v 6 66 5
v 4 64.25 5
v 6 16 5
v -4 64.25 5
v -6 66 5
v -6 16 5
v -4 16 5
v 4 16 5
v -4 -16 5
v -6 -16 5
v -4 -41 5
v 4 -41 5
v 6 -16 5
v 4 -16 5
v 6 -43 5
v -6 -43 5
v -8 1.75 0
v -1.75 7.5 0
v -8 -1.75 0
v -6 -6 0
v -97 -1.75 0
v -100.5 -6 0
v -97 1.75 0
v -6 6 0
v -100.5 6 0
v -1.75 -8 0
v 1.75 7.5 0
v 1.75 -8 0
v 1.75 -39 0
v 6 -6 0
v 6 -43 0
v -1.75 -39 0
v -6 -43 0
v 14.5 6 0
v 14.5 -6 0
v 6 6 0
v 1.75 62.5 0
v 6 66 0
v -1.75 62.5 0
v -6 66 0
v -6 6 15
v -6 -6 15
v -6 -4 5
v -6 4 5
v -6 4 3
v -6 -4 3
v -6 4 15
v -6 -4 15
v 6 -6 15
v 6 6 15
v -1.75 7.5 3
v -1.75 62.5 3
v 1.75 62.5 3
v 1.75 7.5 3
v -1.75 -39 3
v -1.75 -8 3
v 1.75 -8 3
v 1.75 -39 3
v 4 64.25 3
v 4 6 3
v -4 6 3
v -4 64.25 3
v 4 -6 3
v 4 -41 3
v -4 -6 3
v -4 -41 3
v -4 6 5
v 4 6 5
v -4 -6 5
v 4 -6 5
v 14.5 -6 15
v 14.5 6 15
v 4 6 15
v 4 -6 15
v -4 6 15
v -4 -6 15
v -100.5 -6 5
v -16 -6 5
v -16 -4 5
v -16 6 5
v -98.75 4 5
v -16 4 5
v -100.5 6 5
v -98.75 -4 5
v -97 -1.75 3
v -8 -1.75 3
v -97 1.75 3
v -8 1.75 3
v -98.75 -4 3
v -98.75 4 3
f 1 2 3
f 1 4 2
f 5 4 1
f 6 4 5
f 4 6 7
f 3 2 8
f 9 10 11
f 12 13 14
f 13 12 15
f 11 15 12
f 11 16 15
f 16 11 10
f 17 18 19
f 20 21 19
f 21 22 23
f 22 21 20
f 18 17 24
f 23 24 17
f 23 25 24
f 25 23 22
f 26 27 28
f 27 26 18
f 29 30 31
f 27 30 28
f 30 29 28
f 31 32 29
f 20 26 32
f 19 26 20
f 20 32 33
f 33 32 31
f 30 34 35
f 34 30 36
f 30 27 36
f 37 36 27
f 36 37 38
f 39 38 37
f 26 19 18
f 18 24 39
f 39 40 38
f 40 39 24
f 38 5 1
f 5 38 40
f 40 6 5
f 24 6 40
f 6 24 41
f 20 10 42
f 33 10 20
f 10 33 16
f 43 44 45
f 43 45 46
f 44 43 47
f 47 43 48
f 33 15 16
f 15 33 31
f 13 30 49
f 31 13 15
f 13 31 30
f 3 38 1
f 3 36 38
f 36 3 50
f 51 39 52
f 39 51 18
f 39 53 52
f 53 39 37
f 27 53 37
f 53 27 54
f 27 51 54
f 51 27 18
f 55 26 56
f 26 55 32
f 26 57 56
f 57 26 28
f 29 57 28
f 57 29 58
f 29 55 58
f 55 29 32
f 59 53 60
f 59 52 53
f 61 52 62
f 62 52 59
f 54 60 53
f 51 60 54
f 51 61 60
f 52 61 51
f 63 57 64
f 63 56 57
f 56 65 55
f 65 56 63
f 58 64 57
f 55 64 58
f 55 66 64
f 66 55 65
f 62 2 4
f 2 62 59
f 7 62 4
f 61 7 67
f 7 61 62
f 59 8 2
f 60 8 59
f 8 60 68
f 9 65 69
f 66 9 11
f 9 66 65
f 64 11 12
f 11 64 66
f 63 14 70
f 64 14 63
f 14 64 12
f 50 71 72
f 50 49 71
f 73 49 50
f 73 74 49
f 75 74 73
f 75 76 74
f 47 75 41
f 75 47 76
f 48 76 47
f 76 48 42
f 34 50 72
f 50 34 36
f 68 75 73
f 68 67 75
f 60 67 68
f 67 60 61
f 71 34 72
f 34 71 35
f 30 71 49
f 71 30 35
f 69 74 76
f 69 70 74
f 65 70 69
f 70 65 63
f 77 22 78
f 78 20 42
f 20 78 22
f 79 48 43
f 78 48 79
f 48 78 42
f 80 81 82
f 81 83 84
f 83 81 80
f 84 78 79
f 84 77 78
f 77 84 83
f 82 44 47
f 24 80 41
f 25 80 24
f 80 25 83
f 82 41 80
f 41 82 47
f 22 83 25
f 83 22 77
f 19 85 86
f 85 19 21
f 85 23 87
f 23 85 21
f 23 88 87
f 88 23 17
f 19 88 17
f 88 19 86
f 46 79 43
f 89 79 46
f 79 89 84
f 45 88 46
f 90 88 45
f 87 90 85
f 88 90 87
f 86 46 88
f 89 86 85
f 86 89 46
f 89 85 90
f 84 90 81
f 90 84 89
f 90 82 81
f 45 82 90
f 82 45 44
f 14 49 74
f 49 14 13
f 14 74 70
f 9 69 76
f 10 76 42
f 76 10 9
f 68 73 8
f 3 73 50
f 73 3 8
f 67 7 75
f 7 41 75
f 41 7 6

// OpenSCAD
//Phone Microscope Adapter Body

module triangle_support(){
linear_extrude(height=2)polygon([[0,0],[10,0],[0,10]]);
}

mirror([0,1,0]){

//Body of Adapter
rotate([180,0,0])translate([0,0,-15])union(){

	//Center Connector
		linear_extrude(height=15)translate([-12/2,-6,0])square([20.5,12]);

	//Horizontal arms
		difference(){
			translate([0,0,10])linear_extrude(height=5)difference(){
				translate([-6,-43,0])square([12,109]);
				union(){
					translate([0,-23.5,-.5])square([3.5,31], center=true);
					translate([0,35,-.5])square([3.5,55], center=true);
				}
			}
			translate([0,0,9])linear_extrude(height=3){
				union(){
					translate([0,-23,-.5])square([8,36], center=true);
					translate([0,34.5,-.5])square([8,59.5], center=true);
				}
			}
		}
}

//Horizontal arm triangular supports
	translate([6,6,5])rotate([0,270,0])triangle_support();
	translate([-4,6,5])rotate([0,270,0])triangle_support();
	translate([4,-6,5])rotate([0,270,180])triangle_support();
	translate([-6,-6,5])rotate([0,270,180])triangle_support();

//Vertical arm
	rotate([180,0,0])union(){

	//Vertical arm triangular supports
		translate([-1,-2,-10])rotate([0,0,270]){
			translate([4,-5,5])rotate([0,90,180])triangle_support();
			translate([-6,-5,5])rotate([0,90,180])triangle_support();
		}

	translate([0,0,-15]){
		translate([-1,0,0])rotate([0,0,90])difference(){
			translate([0,0,10])linear_extrude(height=5)difference(){
				translate([-6,4,0])square([12,95.5]);
				translate([0,51.5,-.5])square([3.5,89], center=true);
			}
			translate([0,0,9])linear_extrude(height=3){
				translate([0,46.25,-.5])square([8,103], center=true);
			}
		}
	}

}

}
